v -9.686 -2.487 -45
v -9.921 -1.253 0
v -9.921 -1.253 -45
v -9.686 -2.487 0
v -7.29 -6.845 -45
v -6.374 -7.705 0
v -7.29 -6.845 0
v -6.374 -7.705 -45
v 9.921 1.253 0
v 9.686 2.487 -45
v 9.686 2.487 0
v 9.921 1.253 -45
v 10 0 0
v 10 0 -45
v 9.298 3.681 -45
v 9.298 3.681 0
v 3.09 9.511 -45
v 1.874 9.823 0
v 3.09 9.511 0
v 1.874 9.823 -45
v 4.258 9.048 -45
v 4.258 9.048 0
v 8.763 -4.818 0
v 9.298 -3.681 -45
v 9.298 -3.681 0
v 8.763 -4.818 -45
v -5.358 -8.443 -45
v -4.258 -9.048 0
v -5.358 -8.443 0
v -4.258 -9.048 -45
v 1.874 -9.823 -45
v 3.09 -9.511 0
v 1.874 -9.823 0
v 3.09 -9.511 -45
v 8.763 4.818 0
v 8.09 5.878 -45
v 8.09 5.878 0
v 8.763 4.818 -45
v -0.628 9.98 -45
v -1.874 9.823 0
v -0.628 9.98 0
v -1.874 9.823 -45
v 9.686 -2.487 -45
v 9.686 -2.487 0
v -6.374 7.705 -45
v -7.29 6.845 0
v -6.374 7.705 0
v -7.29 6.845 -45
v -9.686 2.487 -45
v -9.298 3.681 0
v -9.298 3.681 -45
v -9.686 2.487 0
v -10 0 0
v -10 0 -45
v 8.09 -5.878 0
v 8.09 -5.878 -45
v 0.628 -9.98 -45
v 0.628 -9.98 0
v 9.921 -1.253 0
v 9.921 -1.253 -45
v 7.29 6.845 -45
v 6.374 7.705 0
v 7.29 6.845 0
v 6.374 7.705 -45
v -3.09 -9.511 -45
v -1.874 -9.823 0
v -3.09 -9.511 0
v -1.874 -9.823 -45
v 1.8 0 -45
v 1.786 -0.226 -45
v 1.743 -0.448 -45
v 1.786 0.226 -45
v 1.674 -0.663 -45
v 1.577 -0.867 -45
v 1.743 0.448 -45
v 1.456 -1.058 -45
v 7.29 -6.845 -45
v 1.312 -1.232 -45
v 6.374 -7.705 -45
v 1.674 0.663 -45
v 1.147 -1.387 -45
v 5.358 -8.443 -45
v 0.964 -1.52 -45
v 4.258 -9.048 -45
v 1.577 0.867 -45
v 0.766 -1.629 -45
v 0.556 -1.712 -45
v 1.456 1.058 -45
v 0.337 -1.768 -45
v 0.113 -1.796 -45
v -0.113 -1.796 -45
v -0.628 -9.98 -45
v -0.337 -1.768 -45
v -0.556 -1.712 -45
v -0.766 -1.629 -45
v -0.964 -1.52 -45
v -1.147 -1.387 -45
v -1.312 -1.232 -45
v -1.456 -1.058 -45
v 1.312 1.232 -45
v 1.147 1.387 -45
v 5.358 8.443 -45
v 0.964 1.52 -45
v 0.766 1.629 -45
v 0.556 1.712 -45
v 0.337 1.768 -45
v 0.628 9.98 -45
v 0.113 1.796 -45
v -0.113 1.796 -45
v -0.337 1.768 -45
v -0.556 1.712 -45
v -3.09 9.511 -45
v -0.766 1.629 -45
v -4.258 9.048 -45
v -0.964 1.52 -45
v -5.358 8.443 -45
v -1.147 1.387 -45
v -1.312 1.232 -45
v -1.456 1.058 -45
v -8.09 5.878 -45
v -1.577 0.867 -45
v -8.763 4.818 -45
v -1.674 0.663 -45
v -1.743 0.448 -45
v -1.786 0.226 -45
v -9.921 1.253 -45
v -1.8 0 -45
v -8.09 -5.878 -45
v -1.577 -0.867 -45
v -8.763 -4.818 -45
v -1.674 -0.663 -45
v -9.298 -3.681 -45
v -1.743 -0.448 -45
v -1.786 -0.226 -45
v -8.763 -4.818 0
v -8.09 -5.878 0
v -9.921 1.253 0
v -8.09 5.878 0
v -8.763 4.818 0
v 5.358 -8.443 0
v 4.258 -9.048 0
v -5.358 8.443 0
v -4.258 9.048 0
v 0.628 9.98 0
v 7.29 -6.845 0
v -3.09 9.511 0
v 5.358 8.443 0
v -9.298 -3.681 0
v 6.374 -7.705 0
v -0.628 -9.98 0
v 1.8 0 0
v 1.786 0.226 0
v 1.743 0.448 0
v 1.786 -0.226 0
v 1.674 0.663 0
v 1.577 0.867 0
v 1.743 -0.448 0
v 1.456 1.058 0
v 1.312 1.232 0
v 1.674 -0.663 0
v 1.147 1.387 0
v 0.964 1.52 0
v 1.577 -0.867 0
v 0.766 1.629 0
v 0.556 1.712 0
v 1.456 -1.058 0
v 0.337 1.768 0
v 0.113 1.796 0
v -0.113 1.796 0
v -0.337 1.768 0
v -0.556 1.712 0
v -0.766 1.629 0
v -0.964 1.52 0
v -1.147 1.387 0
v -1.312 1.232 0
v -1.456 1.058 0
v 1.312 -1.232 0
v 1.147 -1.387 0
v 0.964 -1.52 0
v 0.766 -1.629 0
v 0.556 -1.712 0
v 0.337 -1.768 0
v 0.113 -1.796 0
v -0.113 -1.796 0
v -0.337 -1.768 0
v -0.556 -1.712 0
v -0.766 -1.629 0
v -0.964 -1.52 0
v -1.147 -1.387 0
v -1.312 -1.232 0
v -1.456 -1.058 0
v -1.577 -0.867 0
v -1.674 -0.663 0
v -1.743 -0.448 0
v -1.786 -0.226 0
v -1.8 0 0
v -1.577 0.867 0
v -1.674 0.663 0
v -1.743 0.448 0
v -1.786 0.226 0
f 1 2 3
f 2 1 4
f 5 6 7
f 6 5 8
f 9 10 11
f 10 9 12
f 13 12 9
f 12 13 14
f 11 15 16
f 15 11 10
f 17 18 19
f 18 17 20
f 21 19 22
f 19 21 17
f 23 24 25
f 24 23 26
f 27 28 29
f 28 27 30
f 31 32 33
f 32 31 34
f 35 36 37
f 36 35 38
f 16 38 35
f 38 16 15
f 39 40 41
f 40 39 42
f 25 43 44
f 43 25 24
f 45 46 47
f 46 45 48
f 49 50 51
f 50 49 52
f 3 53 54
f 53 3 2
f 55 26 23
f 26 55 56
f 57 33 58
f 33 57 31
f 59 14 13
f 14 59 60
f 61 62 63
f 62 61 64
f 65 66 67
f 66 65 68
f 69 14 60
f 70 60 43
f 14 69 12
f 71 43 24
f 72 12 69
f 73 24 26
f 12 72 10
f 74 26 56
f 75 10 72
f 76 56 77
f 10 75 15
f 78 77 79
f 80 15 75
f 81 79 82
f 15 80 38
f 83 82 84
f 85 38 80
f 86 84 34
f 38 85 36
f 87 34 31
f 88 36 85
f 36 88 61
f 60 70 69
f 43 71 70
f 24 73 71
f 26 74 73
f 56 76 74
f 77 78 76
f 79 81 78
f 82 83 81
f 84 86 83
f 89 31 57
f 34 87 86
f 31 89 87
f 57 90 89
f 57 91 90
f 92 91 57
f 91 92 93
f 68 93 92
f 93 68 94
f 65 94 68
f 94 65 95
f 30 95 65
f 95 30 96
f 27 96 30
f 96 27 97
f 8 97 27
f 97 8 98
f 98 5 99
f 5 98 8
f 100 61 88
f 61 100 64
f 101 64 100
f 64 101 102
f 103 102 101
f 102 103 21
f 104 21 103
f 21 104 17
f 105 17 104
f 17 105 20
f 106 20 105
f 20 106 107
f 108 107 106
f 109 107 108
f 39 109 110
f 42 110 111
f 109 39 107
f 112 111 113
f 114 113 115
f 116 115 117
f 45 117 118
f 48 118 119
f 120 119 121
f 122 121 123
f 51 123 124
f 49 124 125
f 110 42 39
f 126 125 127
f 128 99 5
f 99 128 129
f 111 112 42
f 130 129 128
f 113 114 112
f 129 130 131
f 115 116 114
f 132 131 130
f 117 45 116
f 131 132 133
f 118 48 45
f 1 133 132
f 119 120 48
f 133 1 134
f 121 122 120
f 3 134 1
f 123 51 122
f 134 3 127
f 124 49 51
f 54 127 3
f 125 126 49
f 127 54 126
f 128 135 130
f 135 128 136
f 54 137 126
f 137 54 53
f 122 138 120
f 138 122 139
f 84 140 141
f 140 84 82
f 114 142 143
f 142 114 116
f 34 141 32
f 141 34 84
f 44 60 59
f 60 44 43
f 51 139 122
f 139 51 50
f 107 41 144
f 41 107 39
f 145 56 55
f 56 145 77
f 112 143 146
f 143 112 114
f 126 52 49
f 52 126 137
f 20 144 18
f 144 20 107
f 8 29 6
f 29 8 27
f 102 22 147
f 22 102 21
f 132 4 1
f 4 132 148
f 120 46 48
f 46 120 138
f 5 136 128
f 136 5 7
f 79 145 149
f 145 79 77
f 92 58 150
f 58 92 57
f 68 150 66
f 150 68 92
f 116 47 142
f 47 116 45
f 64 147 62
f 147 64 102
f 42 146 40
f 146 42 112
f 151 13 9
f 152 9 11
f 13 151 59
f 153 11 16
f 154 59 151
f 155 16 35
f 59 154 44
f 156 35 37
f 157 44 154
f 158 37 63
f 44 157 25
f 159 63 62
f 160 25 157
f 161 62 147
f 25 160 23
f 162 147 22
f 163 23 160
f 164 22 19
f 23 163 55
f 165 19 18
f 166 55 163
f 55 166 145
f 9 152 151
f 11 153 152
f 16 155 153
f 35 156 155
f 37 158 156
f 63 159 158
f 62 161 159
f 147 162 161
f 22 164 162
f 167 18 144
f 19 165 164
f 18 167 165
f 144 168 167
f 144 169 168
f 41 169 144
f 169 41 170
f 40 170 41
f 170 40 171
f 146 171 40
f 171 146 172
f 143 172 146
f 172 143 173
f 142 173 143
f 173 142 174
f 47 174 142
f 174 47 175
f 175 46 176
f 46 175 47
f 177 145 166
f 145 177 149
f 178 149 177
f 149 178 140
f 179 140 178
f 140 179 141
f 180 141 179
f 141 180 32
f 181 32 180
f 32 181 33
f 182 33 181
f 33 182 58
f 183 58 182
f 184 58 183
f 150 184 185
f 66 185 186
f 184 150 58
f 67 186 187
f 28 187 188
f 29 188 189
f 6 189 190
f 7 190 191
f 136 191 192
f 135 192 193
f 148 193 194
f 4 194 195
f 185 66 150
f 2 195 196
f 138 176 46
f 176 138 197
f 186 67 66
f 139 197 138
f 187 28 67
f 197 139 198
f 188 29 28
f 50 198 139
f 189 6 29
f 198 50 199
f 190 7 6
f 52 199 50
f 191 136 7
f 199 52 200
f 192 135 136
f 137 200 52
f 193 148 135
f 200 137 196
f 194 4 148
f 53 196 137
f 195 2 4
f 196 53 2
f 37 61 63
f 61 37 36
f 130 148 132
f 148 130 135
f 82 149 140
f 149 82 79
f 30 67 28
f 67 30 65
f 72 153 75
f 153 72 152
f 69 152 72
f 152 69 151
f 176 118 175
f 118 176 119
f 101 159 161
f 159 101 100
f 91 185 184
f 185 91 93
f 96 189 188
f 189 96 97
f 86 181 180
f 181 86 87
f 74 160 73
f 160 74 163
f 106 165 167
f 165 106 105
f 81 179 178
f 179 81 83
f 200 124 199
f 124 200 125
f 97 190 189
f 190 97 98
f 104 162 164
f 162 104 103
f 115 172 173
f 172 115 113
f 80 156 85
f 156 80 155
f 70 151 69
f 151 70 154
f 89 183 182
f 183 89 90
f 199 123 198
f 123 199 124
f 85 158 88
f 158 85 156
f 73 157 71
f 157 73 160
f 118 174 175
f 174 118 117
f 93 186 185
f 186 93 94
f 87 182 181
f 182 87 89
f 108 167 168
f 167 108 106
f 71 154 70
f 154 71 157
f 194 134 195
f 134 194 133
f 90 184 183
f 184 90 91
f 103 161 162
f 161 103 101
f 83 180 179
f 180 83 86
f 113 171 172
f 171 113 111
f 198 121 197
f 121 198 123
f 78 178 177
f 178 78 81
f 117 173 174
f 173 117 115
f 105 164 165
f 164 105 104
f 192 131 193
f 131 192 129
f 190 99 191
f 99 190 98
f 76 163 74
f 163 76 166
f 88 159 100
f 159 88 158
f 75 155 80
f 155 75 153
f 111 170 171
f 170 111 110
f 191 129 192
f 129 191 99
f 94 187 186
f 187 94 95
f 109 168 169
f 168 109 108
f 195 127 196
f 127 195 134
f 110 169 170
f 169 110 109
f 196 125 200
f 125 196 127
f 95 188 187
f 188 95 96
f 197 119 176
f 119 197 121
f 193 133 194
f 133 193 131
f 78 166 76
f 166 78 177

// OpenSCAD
$fn = 50;


difference() {
	union() {
		translate(v = [0, 0, -45.0000000000]) {
			cylinder(h = 45, r = 10.0000000000);
		}
		cylinder(h = 0, r = 13.0000000000);
	}
	union() {
		#translate(v = [0, 0, -45]) {
			cylinder(h = 45, r = 1.8000000000);
		}
	}
}
